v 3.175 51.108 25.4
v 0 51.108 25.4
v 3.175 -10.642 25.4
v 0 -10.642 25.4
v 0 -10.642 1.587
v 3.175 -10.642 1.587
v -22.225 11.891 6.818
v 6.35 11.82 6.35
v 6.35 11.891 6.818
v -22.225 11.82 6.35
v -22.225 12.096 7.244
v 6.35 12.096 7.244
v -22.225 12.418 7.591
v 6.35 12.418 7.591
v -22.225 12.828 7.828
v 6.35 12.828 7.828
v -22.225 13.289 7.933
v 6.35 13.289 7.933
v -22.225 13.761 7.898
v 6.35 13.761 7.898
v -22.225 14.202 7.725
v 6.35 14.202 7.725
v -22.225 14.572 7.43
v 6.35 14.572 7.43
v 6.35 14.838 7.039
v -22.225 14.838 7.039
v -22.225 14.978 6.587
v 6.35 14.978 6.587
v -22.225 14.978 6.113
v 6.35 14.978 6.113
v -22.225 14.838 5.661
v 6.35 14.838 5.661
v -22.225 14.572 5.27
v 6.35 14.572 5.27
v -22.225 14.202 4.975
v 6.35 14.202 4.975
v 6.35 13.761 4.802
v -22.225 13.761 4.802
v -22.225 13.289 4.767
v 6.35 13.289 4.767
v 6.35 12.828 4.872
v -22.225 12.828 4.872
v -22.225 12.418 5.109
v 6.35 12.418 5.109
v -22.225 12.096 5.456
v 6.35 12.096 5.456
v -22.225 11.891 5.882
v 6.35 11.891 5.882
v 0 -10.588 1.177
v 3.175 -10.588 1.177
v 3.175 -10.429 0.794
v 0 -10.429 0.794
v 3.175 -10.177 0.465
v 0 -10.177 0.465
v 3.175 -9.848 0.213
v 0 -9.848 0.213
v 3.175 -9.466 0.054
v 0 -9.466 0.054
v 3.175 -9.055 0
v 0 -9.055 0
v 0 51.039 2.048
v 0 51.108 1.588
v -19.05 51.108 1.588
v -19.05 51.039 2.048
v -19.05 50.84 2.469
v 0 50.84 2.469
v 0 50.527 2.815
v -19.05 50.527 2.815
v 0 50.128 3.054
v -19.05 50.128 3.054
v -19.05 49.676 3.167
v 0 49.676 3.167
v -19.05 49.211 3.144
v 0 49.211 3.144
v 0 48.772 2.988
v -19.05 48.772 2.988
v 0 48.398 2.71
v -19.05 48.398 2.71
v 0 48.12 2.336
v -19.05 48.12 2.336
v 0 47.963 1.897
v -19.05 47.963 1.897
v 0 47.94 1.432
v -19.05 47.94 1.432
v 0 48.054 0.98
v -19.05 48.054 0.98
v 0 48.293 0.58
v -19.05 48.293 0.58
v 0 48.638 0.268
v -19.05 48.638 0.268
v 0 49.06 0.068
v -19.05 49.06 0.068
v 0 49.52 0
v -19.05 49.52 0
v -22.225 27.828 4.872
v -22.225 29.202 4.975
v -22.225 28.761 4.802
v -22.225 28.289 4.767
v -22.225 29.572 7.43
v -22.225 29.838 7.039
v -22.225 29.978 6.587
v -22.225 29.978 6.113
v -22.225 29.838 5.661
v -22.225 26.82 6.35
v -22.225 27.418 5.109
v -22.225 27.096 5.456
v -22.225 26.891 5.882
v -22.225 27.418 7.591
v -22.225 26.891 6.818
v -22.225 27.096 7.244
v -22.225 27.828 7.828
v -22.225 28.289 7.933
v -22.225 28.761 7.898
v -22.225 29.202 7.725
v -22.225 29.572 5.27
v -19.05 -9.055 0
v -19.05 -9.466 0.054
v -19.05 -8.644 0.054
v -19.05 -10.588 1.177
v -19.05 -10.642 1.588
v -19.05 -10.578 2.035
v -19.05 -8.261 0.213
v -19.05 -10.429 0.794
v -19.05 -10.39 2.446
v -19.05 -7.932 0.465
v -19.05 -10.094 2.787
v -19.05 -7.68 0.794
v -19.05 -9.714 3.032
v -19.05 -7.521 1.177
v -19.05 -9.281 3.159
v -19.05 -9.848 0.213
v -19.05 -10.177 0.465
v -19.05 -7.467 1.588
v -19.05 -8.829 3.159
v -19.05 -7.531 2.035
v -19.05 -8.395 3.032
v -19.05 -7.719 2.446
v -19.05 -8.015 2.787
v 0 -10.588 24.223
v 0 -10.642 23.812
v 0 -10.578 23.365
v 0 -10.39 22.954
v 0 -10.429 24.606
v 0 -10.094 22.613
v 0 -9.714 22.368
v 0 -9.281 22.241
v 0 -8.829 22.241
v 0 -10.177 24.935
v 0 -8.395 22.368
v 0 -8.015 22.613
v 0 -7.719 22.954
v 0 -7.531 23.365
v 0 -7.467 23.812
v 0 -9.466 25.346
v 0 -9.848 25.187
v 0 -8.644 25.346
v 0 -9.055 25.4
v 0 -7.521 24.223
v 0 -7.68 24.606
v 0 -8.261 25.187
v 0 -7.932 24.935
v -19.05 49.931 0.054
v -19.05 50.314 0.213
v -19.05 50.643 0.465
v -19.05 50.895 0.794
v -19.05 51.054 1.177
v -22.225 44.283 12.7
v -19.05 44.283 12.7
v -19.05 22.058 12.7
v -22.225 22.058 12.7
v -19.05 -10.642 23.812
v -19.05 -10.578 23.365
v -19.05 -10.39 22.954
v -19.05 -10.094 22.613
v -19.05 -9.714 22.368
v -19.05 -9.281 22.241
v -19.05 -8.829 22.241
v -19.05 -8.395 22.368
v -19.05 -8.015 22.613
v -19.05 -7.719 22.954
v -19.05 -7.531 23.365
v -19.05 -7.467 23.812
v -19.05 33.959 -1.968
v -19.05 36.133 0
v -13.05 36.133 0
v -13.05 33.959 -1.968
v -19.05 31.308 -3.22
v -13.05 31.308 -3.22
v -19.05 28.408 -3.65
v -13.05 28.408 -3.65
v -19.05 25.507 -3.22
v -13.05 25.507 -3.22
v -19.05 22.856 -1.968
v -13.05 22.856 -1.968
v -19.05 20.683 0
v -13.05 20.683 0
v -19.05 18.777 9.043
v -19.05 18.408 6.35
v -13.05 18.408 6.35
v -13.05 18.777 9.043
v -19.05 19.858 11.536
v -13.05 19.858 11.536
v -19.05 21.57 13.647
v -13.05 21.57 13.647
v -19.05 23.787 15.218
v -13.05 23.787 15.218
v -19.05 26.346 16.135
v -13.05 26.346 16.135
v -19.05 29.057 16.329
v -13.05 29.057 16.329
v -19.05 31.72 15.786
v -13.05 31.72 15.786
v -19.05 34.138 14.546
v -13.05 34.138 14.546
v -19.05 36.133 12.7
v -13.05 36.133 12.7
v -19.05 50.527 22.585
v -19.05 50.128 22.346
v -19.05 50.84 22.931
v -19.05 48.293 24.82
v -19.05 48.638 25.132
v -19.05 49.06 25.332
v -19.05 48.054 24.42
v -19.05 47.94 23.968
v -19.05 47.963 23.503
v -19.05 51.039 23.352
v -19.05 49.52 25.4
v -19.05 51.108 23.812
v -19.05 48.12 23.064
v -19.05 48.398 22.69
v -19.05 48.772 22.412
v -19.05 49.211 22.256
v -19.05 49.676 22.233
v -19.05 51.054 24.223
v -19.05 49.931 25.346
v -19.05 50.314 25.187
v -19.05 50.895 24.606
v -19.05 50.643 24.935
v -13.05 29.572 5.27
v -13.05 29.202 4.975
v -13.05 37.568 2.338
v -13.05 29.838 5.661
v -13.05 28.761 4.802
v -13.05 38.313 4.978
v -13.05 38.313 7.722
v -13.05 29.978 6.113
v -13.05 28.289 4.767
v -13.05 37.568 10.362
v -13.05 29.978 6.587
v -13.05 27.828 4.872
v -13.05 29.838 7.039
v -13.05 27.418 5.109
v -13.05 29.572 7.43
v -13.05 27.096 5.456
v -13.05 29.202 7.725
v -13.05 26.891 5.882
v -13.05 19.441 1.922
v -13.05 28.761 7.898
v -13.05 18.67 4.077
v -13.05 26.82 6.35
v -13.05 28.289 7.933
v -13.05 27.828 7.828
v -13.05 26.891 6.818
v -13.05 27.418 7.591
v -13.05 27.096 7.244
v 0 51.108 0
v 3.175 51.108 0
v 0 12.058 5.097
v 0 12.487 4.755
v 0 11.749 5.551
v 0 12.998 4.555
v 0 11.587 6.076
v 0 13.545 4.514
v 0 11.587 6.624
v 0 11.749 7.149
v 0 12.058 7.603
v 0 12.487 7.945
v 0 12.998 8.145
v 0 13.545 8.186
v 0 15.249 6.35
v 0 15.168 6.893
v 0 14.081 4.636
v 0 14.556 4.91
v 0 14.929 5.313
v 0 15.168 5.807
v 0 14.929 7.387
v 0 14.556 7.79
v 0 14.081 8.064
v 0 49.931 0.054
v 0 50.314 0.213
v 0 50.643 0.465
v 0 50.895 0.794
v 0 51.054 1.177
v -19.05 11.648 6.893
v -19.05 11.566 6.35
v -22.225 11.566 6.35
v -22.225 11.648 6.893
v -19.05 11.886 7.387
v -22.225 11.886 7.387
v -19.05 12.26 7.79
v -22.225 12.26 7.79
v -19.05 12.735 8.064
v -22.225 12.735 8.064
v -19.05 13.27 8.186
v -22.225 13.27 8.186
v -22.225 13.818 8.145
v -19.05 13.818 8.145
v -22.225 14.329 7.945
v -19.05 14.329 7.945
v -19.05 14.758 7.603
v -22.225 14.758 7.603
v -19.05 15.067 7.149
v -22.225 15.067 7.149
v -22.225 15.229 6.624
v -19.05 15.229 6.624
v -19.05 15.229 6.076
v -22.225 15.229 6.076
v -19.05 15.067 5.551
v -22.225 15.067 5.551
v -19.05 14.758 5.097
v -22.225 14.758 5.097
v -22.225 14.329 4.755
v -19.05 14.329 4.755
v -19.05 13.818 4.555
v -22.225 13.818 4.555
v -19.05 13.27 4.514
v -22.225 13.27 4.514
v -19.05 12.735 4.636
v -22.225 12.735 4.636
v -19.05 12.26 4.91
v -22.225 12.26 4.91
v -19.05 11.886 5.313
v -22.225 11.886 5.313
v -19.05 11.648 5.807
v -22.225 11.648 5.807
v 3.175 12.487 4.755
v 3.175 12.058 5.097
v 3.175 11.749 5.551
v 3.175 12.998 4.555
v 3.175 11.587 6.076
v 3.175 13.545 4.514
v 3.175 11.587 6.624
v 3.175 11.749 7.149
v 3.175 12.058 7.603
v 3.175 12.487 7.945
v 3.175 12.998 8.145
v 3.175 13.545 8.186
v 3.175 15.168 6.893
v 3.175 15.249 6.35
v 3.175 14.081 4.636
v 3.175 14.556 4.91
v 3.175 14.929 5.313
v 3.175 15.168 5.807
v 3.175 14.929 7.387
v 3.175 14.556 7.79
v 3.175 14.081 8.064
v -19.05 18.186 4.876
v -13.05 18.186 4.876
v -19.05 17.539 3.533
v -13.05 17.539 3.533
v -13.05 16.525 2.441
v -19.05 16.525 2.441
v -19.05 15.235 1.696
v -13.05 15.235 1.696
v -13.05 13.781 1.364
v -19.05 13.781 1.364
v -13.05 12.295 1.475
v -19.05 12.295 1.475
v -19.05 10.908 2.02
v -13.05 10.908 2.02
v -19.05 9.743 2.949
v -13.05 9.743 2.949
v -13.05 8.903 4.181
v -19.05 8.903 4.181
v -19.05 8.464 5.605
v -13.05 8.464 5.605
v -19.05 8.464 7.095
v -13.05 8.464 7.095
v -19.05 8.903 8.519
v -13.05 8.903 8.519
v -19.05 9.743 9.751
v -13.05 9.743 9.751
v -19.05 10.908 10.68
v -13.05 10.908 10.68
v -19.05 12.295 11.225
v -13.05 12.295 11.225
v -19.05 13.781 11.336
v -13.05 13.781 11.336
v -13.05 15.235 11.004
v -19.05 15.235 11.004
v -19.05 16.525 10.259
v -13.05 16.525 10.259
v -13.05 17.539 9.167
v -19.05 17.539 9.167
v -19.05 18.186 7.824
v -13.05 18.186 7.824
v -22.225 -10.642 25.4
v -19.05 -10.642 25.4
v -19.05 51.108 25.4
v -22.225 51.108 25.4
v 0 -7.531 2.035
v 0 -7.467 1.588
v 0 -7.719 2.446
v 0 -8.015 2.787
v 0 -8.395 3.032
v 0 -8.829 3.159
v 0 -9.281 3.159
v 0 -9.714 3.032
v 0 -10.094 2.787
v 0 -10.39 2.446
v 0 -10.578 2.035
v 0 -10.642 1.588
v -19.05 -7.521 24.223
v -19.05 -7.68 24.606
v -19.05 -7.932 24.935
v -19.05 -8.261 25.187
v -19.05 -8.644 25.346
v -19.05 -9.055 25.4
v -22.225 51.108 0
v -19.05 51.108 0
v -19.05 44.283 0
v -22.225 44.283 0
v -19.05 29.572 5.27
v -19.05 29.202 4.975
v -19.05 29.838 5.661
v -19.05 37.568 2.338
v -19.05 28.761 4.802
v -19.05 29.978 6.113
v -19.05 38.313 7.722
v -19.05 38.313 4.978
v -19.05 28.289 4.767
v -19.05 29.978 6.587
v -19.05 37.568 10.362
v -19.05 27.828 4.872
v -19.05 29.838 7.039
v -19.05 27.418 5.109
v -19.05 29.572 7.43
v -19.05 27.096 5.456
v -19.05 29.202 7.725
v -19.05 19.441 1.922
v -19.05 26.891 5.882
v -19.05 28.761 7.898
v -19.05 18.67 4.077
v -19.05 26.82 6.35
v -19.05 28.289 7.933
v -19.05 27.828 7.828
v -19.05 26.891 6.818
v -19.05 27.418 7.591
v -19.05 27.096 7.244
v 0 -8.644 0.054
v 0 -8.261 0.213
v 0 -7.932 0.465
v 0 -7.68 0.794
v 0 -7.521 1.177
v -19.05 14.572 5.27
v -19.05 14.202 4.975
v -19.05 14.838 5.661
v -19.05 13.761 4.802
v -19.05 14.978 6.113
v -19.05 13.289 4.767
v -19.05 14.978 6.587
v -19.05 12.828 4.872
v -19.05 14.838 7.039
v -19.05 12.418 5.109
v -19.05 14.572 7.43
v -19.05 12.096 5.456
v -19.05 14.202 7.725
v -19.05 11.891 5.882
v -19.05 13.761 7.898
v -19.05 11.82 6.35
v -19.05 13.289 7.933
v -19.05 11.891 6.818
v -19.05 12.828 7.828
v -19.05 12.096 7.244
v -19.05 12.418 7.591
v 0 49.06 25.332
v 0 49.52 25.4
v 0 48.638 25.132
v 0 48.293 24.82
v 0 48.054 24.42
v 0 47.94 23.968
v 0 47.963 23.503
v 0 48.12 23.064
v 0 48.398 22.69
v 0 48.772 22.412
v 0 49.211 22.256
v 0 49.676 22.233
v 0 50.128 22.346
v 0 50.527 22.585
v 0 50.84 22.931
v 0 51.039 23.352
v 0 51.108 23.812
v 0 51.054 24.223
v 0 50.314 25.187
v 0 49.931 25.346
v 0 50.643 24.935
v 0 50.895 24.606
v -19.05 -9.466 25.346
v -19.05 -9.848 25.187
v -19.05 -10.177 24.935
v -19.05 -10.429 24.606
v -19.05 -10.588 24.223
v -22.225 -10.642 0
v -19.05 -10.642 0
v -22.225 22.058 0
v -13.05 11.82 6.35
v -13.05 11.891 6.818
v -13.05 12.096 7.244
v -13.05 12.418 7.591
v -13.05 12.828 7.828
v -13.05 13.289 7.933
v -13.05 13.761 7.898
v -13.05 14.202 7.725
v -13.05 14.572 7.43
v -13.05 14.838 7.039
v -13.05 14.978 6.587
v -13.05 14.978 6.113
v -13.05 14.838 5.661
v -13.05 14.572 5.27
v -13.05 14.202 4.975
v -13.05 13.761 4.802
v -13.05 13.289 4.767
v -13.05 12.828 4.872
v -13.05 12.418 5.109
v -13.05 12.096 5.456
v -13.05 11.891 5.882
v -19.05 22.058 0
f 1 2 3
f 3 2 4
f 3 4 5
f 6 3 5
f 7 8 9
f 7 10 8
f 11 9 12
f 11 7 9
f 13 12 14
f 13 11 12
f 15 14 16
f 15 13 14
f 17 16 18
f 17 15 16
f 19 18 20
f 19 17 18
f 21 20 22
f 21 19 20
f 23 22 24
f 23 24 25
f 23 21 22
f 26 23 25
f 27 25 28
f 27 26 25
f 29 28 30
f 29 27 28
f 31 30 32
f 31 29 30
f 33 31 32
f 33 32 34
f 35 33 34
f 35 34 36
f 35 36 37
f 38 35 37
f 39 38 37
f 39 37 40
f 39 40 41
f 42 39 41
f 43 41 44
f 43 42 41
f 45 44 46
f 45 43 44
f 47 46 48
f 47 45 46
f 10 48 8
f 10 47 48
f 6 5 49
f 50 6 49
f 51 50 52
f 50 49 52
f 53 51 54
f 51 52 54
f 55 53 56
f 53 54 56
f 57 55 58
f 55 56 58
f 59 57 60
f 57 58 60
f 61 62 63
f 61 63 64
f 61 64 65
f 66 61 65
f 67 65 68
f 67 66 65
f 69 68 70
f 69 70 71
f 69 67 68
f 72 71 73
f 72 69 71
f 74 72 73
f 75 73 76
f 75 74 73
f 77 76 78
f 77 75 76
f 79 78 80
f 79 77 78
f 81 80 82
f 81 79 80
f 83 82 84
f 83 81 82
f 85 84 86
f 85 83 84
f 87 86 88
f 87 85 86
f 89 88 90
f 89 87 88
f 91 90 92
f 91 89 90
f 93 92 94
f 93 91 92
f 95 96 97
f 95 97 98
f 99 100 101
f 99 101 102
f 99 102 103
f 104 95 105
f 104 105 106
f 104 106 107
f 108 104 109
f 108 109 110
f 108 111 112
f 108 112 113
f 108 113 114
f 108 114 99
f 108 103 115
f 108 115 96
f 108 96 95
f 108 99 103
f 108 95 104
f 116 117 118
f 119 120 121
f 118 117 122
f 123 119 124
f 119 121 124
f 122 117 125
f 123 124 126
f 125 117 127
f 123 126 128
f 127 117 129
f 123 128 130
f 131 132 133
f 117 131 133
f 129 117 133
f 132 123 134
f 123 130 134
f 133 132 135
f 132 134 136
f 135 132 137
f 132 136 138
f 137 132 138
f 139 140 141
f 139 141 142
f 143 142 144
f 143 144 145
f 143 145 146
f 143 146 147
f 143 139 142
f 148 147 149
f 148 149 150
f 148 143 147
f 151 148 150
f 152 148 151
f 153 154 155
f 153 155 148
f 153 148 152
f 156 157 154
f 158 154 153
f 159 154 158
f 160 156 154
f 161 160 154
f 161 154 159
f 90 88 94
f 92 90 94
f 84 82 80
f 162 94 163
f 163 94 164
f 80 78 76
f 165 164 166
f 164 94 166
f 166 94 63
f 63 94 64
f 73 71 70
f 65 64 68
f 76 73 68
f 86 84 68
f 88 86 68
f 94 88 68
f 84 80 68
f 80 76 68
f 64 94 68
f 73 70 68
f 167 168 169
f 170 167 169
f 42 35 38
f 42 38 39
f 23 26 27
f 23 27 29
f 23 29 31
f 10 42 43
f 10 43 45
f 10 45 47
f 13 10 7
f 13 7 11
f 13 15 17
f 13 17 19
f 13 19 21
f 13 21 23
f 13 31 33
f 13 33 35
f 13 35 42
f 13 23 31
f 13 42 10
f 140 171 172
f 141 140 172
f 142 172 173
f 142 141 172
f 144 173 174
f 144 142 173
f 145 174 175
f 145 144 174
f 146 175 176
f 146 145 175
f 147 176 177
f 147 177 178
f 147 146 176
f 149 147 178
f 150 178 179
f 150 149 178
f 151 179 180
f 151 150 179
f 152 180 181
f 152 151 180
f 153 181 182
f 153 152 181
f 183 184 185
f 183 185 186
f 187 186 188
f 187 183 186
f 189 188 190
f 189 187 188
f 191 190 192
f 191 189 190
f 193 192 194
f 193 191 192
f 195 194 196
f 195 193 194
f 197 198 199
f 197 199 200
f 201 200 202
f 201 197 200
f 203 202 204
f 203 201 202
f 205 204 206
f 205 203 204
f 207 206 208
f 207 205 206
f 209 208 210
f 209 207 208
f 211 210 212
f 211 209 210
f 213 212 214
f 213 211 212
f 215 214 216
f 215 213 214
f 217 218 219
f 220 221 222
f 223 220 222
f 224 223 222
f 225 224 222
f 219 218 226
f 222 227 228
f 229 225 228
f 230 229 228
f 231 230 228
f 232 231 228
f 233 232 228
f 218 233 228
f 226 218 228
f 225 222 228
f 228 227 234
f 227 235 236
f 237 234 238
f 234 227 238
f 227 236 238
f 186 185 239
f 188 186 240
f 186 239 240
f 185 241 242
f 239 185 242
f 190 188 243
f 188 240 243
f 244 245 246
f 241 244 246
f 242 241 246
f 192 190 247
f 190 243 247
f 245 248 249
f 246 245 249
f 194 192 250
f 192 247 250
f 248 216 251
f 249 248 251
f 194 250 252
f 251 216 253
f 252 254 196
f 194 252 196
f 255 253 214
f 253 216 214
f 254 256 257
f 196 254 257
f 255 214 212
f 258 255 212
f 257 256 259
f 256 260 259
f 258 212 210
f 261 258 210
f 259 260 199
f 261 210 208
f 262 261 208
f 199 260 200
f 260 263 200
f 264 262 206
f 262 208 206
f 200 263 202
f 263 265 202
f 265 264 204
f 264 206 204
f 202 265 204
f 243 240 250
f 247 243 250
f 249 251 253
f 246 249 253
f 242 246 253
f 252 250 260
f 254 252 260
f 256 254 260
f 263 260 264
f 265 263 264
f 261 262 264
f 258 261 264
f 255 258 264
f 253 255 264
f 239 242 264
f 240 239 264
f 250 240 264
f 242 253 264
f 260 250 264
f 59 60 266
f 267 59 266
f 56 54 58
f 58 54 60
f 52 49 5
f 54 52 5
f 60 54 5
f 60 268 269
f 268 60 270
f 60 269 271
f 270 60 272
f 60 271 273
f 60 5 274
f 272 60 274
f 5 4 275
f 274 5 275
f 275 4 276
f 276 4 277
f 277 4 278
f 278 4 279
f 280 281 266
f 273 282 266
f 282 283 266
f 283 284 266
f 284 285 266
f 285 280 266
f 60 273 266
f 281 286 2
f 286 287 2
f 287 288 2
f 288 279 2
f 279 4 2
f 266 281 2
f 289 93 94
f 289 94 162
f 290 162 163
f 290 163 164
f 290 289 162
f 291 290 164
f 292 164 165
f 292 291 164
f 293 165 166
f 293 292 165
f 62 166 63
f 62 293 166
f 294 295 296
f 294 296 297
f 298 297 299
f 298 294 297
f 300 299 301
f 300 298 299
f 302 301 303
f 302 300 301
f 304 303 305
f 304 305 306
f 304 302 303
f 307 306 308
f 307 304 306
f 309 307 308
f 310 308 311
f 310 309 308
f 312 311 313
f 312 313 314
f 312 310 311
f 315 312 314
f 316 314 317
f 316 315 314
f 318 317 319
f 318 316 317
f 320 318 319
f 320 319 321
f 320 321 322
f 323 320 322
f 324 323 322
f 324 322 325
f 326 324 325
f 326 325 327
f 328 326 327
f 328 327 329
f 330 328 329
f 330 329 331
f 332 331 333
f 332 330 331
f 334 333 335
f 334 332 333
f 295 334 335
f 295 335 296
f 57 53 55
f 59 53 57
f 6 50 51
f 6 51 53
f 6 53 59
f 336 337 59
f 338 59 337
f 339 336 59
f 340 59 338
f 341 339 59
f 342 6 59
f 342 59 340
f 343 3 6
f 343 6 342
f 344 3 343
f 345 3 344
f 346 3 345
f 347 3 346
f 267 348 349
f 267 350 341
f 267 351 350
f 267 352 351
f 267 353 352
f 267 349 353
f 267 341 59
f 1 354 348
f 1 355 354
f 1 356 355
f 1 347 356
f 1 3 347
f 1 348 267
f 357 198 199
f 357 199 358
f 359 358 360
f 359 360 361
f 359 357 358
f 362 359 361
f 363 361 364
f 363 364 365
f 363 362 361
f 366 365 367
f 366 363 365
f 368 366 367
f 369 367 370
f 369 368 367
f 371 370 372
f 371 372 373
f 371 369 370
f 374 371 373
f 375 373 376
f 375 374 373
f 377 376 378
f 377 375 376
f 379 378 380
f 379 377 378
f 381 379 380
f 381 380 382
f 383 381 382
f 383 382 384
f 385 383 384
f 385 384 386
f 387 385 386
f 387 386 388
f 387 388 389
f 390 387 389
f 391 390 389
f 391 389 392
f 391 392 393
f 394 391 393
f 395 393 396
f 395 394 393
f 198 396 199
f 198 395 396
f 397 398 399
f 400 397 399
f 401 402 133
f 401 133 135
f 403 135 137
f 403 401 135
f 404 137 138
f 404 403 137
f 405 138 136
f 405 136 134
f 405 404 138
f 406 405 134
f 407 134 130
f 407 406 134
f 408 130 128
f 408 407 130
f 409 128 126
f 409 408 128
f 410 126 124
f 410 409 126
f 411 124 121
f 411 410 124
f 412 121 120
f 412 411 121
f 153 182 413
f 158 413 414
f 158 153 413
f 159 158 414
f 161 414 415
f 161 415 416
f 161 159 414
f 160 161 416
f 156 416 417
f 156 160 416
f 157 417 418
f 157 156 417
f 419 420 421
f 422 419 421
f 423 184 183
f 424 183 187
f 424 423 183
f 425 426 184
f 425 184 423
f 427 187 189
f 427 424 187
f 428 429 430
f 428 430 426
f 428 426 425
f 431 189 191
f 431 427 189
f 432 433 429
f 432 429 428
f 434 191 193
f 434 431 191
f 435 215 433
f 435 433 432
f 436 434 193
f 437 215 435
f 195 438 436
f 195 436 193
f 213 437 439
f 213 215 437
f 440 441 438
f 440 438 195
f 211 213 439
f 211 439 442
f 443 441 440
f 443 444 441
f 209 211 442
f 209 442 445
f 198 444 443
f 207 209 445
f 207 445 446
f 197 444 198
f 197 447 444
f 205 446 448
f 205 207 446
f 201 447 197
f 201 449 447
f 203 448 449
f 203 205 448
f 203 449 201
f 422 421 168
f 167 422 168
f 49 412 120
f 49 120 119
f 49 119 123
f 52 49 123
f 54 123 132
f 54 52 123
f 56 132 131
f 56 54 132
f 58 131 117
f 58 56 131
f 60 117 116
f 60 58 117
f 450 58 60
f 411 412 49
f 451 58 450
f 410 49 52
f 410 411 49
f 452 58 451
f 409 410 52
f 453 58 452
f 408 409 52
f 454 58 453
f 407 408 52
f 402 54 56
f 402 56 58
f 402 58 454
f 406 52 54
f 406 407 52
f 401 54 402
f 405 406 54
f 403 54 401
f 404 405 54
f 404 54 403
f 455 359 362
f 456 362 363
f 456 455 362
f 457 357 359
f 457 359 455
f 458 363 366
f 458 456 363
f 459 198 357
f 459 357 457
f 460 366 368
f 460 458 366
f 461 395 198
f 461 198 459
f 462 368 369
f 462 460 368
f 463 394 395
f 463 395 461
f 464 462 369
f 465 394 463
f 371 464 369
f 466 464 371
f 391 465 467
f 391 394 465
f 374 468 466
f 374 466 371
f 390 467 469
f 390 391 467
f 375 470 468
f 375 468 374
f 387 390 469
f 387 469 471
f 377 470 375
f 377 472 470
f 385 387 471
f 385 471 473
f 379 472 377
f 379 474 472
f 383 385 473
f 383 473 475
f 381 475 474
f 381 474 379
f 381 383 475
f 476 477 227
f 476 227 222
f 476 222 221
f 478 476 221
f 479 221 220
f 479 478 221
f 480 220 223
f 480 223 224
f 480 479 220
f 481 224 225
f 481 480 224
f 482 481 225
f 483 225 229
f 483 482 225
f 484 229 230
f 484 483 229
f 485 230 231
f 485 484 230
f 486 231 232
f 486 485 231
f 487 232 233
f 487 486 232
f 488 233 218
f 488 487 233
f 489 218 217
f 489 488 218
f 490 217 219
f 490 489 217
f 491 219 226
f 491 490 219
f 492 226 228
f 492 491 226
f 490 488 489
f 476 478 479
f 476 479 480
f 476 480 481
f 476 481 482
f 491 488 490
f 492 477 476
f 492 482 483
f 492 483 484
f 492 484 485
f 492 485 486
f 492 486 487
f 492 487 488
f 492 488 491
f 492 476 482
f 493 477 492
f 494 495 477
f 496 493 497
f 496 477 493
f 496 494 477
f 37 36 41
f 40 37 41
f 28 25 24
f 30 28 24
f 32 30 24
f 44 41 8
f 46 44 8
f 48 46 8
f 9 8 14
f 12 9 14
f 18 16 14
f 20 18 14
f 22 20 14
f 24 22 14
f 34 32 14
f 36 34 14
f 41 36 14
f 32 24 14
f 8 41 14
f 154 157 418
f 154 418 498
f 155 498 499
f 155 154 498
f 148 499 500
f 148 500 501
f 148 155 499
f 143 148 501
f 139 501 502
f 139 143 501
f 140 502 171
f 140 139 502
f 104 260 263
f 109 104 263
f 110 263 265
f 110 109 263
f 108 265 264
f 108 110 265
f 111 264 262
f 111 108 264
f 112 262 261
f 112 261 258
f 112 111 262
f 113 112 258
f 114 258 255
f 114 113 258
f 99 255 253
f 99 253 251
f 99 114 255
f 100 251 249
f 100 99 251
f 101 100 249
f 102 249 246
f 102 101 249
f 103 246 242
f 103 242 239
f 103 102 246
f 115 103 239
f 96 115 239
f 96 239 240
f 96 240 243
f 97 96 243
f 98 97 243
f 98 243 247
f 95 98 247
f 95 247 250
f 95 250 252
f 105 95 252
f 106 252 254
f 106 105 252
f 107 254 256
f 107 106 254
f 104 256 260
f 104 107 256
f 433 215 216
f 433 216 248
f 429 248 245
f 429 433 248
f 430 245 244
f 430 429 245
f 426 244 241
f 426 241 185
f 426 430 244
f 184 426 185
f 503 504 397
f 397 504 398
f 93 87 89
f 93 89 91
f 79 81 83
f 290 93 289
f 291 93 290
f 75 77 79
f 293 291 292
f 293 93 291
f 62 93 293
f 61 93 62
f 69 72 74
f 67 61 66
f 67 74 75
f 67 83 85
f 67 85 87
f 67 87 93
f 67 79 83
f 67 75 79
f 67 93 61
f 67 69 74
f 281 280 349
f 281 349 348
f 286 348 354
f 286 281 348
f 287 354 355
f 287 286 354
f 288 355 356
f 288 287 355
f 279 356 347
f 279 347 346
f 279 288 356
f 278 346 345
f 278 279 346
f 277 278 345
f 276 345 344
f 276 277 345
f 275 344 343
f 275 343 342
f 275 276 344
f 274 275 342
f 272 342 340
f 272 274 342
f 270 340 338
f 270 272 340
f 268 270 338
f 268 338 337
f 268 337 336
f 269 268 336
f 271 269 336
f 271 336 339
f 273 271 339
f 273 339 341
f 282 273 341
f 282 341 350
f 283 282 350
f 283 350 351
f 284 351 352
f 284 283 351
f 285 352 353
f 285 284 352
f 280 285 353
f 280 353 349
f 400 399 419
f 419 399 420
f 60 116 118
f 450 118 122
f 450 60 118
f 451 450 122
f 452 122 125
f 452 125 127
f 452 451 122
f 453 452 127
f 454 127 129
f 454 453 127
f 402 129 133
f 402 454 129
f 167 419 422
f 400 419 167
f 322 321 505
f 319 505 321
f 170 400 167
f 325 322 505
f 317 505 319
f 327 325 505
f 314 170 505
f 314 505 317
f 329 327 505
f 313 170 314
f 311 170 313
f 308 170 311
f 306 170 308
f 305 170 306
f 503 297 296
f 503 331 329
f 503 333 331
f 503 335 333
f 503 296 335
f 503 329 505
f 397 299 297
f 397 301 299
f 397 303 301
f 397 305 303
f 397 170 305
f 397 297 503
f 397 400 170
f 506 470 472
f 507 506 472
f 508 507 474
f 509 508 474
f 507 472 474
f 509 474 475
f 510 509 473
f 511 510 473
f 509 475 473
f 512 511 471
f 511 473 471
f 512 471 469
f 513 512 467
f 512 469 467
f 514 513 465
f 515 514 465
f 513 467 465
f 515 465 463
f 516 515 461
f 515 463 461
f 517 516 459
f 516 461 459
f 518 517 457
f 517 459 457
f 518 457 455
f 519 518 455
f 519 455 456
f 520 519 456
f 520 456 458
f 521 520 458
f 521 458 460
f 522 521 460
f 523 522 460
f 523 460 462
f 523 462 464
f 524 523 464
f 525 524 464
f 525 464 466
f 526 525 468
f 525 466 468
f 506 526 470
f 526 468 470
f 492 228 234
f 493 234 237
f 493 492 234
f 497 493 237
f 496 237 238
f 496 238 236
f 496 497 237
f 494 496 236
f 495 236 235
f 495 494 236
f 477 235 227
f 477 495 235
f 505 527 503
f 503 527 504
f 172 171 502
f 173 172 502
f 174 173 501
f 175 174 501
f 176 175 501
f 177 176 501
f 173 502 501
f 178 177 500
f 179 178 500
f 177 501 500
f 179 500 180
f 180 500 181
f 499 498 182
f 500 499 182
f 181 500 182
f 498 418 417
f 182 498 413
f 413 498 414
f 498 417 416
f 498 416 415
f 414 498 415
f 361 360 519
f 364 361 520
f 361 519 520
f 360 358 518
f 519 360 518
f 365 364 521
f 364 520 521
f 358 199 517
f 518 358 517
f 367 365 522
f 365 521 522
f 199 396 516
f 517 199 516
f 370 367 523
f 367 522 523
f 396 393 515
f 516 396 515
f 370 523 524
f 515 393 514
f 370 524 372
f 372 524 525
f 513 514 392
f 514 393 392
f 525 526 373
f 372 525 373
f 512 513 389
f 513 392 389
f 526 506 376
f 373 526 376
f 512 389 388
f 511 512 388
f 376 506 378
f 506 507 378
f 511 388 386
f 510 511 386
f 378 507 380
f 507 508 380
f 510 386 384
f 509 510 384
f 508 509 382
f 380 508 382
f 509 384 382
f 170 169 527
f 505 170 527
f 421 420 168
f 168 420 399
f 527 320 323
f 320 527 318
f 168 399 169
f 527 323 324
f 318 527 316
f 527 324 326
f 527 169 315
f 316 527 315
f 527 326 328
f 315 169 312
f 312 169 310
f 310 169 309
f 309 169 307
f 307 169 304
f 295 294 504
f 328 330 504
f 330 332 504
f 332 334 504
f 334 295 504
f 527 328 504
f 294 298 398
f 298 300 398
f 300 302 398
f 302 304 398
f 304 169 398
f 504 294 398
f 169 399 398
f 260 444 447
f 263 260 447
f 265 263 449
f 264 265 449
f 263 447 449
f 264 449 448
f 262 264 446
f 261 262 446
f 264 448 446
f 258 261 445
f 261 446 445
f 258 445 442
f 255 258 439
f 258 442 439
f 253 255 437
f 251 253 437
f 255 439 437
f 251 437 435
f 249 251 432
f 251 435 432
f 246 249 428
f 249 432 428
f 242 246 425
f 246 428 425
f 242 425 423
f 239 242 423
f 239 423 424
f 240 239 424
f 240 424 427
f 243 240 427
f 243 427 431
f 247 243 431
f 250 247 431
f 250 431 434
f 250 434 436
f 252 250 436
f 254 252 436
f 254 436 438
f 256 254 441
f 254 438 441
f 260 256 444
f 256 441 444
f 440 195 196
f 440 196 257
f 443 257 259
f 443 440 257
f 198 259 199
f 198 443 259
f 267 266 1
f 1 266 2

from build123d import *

# Parameters (mm, degrees)
F0_R      = 5
F0_R_2    = 1.8415
F0_R_3    = 1.5875
F1_DEPTH  = 3.175
F2_DEPTH  = 19.05
F3_R      = 1.8415
F4_DEPTH  = 3.175
F3_R_2    = 1.5875
F5_DEPTH  = 3.175
F6_DEPTH  = 6
F7_DEPTH  = 6
F8_DEPTH  = 3.175
F9_DEPTH  = 25.4
F10_DEPTH = 6


# Not quite as in the source:
# - a feature names something its author has since deleted; it is built from what else it names


with BuildPart() as f1:
    # F0 (on Right) → F1 (new body)
    with BuildSketch(Plane.YZ):
        with BuildLine():
            ThreePointArc((18.4078367749, 6.35), (25.0352423421, 15.7641174197), (36.1329581332, 12.7))
            Line((36.1329581332, 12.7), (44.2828367749, 12.7))
            Line((44.2828367749, 12.7), (44.2828367749, 0))
            Line((44.2828367749, 0), (49.5203367749, 0))
            ThreePointArc((49.5203367749, 0), (48.3978047598, 2.7100320151), (51.1078367749, 1.5875))
            Line((51.1078367749, 1.5875), (51.1078367749, 23.8125))
            ThreePointArc((51.1078367749, 23.8125), (48.3978047598, 22.6899679849), (49.5203367749, 25.4))
            Line((49.5203367749, 25.4), (41.8216693056, 25.4))
            Line((41.8216693056, 25.4), (35.8211970083, 25.4))
            Line((35.8211970083, 25.4), (-9.0546632251, 25.4))
            ThreePointArc((-9.0546632251, 25.4), (-7.9321312099, 24.9350320151), (-7.4671632251, 23.8125))
            ThreePointArc((-7.4671632251, 23.8125), (-9.0546632251, 22.225), (-10.6421632251, 23.8125))
            Line((-10.6421632251, 23.8125), (-10.6421632251, 1.5875))
            ThreePointArc((-10.6421632251, 1.5875), (-9.0546632251, 3.175), (-7.4671632251, 1.5875))
            ThreePointArc((-7.4671632251, 1.5875), (-7.9321312099, 0.4649679849), (-9.0546632251, 0))
            Line((-9.0546632251, 0), (20.6827154167, 0))
            ThreePointArc((20.6827154167, 0), (18.9937193553, 2.9774055671), (18.4078367749, 6.35))
        make_face()
        with Locations((13.4078367749, 6.35)):
            Circle(F0_R, mode=Mode.SUBTRACT)
        with BuildLine():
            ThreePointArc((36.1329581332, 0), (37.8219541946, 2.9774055671), (38.4078367749, 6.35))
            ThreePointArc((38.4078367749, 6.35), (37.8219541946, 9.7225944329), (36.1329581332, 12.7))
            Line((36.1329581332, 12.7), (22.0578367749, 12.7))
            Line((22.0578367749, 12.7), (22.0578367749, 0))
            Line((22.0578367749, 0), (36.1329581332, 0))
        make_face()
        with Locations((28.4078367749, 6.35)):
            Circle(F0_R_2, mode=Mode.SUBTRACT)
        with BuildLine():
            ThreePointArc((36.1329581332, 12.7), (37.8219541946, 9.7225944329), (38.4078367749, 6.35))
            ThreePointArc((38.4078367749, 6.35), (37.8219541946, 2.9774055671), (36.1329581332, 0))
            Line((36.1329581332, 0), (43.4878367749, 0))
            Line((43.4878367749, 0), (44.2828367749, 0))
            Line((44.2828367749, 0), (44.2828367749, 12.7))
            Line((44.2828367749, 12.7), (36.1329581332, 12.7))
        make_face()
        with Locations((13.4078367749, 6.35)):
            Circle(F0_R)
        with Locations((13.4078367749, 6.35)):
            Circle(F0_R_2, mode=Mode.SUBTRACT)
        with BuildLine():
            Line((22.0578367749, 12.7), (36.1329581332, 12.7))
            ThreePointArc((36.1329581332, 12.7), (25.0352423421, 15.7641174197), (18.4078367749, 6.35))
            ThreePointArc((18.4078367749, 6.35), (18.9937193553, 2.9774055671), (20.6827154167, 0))
            Line((20.6827154167, 0), (22.0578367749, 0))
            Line((22.0578367749, 0), (22.0578367749, 12.7))
        make_face()
        with Locations((28.4078367749, 6.35)):
            Circle(F0_R_2)
        with Locations((28.4078367749, 6.35)):
            Circle(F0_R_3, mode=Mode.SUBTRACT)
        with BuildLine():
            ThreePointArc((-10.6421632251, 1.5875), (-10.1771952402, 0.4649679849), (-9.0546632251, 0))
            ThreePointArc((-9.0546632251, 0), (-7.9321312099, 0.4649679849), (-7.4671632251, 1.5875))
            ThreePointArc((-7.4671632251, 1.5875), (-9.0546632251, 3.175), (-10.6421632251, 1.5875))
        make_face()
        with BuildLine():
            ThreePointArc((51.1078367749, 1.5875), (48.3978047598, 2.7100320151), (49.5203367749, 0))
            ThreePointArc((49.5203367749, 0), (50.6428687901, 0.4649679849), (51.1078367749, 1.5875))
        make_face()
        with BuildLine():
            ThreePointArc((-9.0546632251, 25.4), (-10.1771952402, 24.9350320151), (-10.6421632251, 23.8125))
            ThreePointArc((-10.6421632251, 23.8125), (-9.0546632251, 22.225), (-7.4671632251, 23.8125))
            ThreePointArc((-7.4671632251, 23.8125), (-7.9321312099, 24.9350320151), (-9.0546632251, 25.4))
        make_face()
        with BuildLine():
            ThreePointArc((49.5203367749, 25.4), (48.3978047598, 22.6899679849), (51.1078367749, 23.8125))
            ThreePointArc((51.1078367749, 23.8125), (50.6428687901, 24.9350320151), (49.5203367749, 25.4))
        make_face()
        with Locations((28.4078367749, 6.35)):
            Circle(F0_R_3)
        with BuildLine():
            ThreePointArc((51.1078367749, 1.5875), (50.6428687901, 0.4649679849), (49.5203367749, 0))
            Line((49.5203367749, 0), (50.2833090723, 0))
            Line((50.2833090723, 0), (51.1078367749, 0))
            Line((51.1078367749, 0), (51.1078367749, 1.5875))
        make_face()
        with BuildLine():
            Line((-10.6421632251, 25.4), (-10.6421632251, 23.8125))
            ThreePointArc((-10.6421632251, 23.8125), (-10.1771952402, 24.9350320151), (-9.0546632251, 25.4))
            Line((-9.0546632251, 25.4), (-10.6421632251, 25.4))
        make_face()
        with BuildLine():
            ThreePointArc((49.5203367749, 25.4), (50.6428687901, 24.9350320151), (51.1078367749, 23.8125))
            Line((51.1078367749, 23.8125), (51.1078367749, 25.4))
            Line((51.1078367749, 25.4), (49.5203367749, 25.4))
        make_face()
    extrude(amount=F1_DEPTH)


with BuildPart() as f2:
    # F0 (on Right) → F2 (new body)
    with BuildSketch(Plane.YZ):
        with BuildLine():
            ThreePointArc((-10.6421632251, 1.5875), (-10.1771952402, 0.4649679849), (-9.0546632251, 0))
            ThreePointArc((-9.0546632251, 0), (-7.9321312099, 0.4649679849), (-7.4671632251, 1.5875))
            ThreePointArc((-7.4671632251, 1.5875), (-9.0546632251, 3.175), (-10.6421632251, 1.5875))
        make_face()
    extrude(amount=-F2_DEPTH)


with BuildPart() as f2b:
    # F0 (on Right) → F2, piece 2 (new body)
    with BuildSketch(Plane.YZ):
        with BuildLine():
            ThreePointArc((51.1078367749, 1.5875), (48.3978047598, 2.7100320151), (49.5203367749, 0))
            ThreePointArc((49.5203367749, 0), (50.6428687901, 0.4649679849), (51.1078367749, 1.5875))
        make_face()
    extrude(amount=-F2_DEPTH)


with BuildPart() as f2c:
    # F0 (on Right) → F2, piece 3 (new body)
    with BuildSketch(Plane.YZ):
        with BuildLine():
            ThreePointArc((-9.0546632251, 25.4), (-10.1771952402, 24.9350320151), (-10.6421632251, 23.8125))
            ThreePointArc((-10.6421632251, 23.8125), (-9.0546632251, 22.225), (-7.4671632251, 23.8125))
            ThreePointArc((-7.4671632251, 23.8125), (-7.9321312099, 24.9350320151), (-9.0546632251, 25.4))
        make_face()
    extrude(amount=-F2_DEPTH)


with BuildPart() as f2d:
    # F0 (on Right) → F2, piece 4 (new body)
    with BuildSketch(Plane.YZ):
        with BuildLine():
            ThreePointArc((49.5203367749, 25.4), (48.3978047598, 22.6899679849), (51.1078367749, 23.8125))
            ThreePointArc((51.1078367749, 23.8125), (50.6428687901, 24.9350320151), (49.5203367749, 25.4))
        make_face()
    extrude(amount=-F2_DEPTH)


with BuildPart() as f4:
    # F3 (on face) → F4 (new body)
    with BuildSketch(Plane(origin=(-19.05, 0, 0), x_dir=(0, -1, 0), z_dir=(-1, 0, 0))):
        with BuildLine():
            Line((10.6421632251, 25.4), (-49.5203367749, 25.4))
            ThreePointArc((-49.5203367749, 25.4), (-48.3978047598, 24.9350320151), (-47.9328367749, 23.8125))
            ThreePointArc((-47.9328367749, 23.8125), (-49.5203367749, 22.225), (-51.1078367749, 23.8125))
            Line((-51.1078367749, 23.8125), (-51.1078367749, 0))
            Line((-51.1078367749, 0), (-44.2828367749, 0))
            Line((-44.2828367749, 0), (-44.2828367749, 12.7))
            Line((-44.2828367749, 12.7), (-36.1329581332, 12.7))
            ThreePointArc((-36.1329581332, 12.7), (-25.0352423421, 15.7641174197), (-18.4078367749, 6.35))
            ThreePointArc((-18.4078367749, 6.35), (-18.9937193553, 2.9774055671), (-20.6827154167, 0))
            Line((-20.6827154167, 0), (10.6421632251, 0))
            Line((10.6421632251, 0), (10.6421632251, 25.4))
        make_face()
        with BuildLine():
            ThreePointArc((-8.4078367749, 6.35), (-13.4078367749, 1.35), (-18.4078367749, 6.35))
            ThreePointArc((-18.4078367749, 6.35), (-13.4078367749, 11.35), (-8.4078367749, 6.35))
        make_face(mode=Mode.SUBTRACT)
        with BuildLine():
            ThreePointArc((-8.4078367749, 6.35), (-13.4078367749, 11.35), (-18.4078367749, 6.35))
            ThreePointArc((-18.4078367749, 6.35), (-13.4078367749, 1.35), (-8.4078367749, 6.35))
        make_face()
        with Locations((-13.4078367749, 6.35)):
            Circle(F3_R, mode=Mode.SUBTRACT)
        with BuildLine():
            Line((-22.0578367749, 0), (-20.6827154167, 0))
            ThreePointArc((-20.6827154167, 0), (-18.9937193553, 2.9774055671), (-18.4078367749, 6.35))
            ThreePointArc((-18.4078367749, 6.35), (-25.0352423421, 15.7641174197), (-36.1329581332, 12.7))
            Line((-36.1329581332, 12.7), (-22.0578367749, 12.7))
            Line((-22.0578367749, 12.7), (-22.0578367749, 6.35))
            Line((-22.0578367749, 6.35), (-22.0578367749, 0))
        make_face()
        with BuildLine():
            ThreePointArc((-47.9328367749, 23.8125), (-48.3978047598, 24.9350320151), (-49.5203367749, 25.4))
            ThreePointArc((-49.5203367749, 25.4), (-50.6428687901, 24.9350320151), (-51.1078367749, 23.8125))
            ThreePointArc((-51.1078367749, 23.8125), (-49.5203367749, 22.225), (-47.9328367749, 23.8125))
        make_face()
        with BuildLine():
            Line((-49.5203367749, 25.4), (-51.1078367749, 25.4))
            Line((-51.1078367749, 25.4), (-51.1078367749, 23.8125))
            ThreePointArc((-51.1078367749, 23.8125), (-50.6428687901, 24.9350320151), (-49.5203367749, 25.4))
        make_face()
    extrude(amount=F4_DEPTH)


with BuildPart() as f5:
    # F3 (on face) → F5 (new body)
    with BuildSketch(Plane(origin=(-19.05, 0, 0), x_dir=(0, -1, 0), z_dir=(-1, 0, 0))):
        with Locations((-28.4078367749, 6.35)):
            Circle(F3_R_2)
    extrude(amount=F5_DEPTH)

    # F3 (on face) → F6 (join)
    with BuildSketch(Plane(origin=(-19.05, 0, 0), x_dir=(0, -1, 0), z_dir=(-1, 0, 0))):
        with Locations((-28.4078367749, 6.35)):
            Circle(F3_R_2)
    extrude(amount=-F6_DEPTH)


with BuildPart() as f7:
    # F3 (on face) → F7 (new body)
    with BuildSketch(Plane(origin=(-19.05, 0, 0), x_dir=(0, -1, 0), z_dir=(-1, 0, 0))):
        with BuildLine():
            ThreePointArc((-36.1329581332, 12.7), (-38.4078367749, 6.35), (-36.1329581332, 0))
            Line((-36.1329581332, 0), (-22.0578367749, 0))
            Line((-22.0578367749, 0), (-22.0578367749, 6.35))
            Line((-22.0578367749, 6.35), (-22.0578367749, 12.7))
            Line((-22.0578367749, 12.7), (-36.1329581332, 12.7))
        make_face()
        with Locations((-28.4078367749, 6.35)):
            Circle(F3_R, mode=Mode.SUBTRACT)
        with BuildLine():
            Line((-22.0578367749, 0), (-20.6827154167, 0))
            ThreePointArc((-20.6827154167, 0), (-18.9937193553, 2.9774055671), (-18.4078367749, 6.35))
            ThreePointArc((-18.4078367749, 6.35), (-25.0352423421, 15.7641174197), (-36.1329581332, 12.7))
            Line((-36.1329581332, 12.7), (-22.0578367749, 12.7))
            Line((-22.0578367749, 12.7), (-22.0578367749, 6.35))
            Line((-22.0578367749, 6.35), (-22.0578367749, 0))
        make_face()
        with BuildLine():
            ThreePointArc((-36.1329581332, 0), (-28.4078367749, -3.65), (-20.6827154167, 0))
            Line((-20.6827154167, 0), (-22.0578367749, 0))
            Line((-22.0578367749, 0), (-36.1329581332, 0))
        make_face()
        with Locations((-28.4078367749, 6.35)):
            Circle(F3_R)
        with Locations((-28.4078367749, 6.35)):
            Circle(F3_R_2, mode=Mode.SUBTRACT)
    extrude(amount=-F7_DEPTH)


with BuildPart() as f8:
    # F3 (on face) → F8 (new body)
    with BuildSketch(Plane(origin=(-19.05, 0, 0), x_dir=(0, -1, 0), z_dir=(-1, 0, 0))):
        with Locations((-13.4078367749, 6.35)):
            Circle(F3_R_2)
    extrude(amount=F8_DEPTH)

    # F3 (on face) → F9 (join)
    with BuildSketch(Plane(origin=(-19.05, 0, 0), x_dir=(0, -1, 0), z_dir=(-1, 0, 0))):
        with Locations((-13.4078367749, 6.35)):
            Circle(F3_R_2)
    extrude(amount=-F9_DEPTH)


with BuildPart() as f10:
    # F3 (on face) → F10 (new body)
    with BuildSketch(Plane(origin=(-19.05, 0, 0), x_dir=(0, -1, 0), z_dir=(-1, 0, 0))):
        with BuildLine():
            ThreePointArc((-8.4078367749, 6.35), (-13.4078367749, 11.35), (-18.4078367749, 6.35))
            ThreePointArc((-18.4078367749, 6.35), (-13.4078367749, 1.35), (-8.4078367749, 6.35))
        make_face()
        with Locations((-13.4078367749, 6.35)):
            Circle(F3_R, mode=Mode.SUBTRACT)
        with Locations((-13.4078367749, 6.35)):
            Circle(F3_R)
        with Locations((-13.4078367749, 6.35)):
            Circle(F3_R_2, mode=Mode.SUBTRACT)
    extrude(amount=-F10_DEPTH)


solid = Compound([f1.part, f2.part, f2b.part, f2c.part, f2d.part, f4.part, f5.part, f7.part, f8.part, f10.part])
